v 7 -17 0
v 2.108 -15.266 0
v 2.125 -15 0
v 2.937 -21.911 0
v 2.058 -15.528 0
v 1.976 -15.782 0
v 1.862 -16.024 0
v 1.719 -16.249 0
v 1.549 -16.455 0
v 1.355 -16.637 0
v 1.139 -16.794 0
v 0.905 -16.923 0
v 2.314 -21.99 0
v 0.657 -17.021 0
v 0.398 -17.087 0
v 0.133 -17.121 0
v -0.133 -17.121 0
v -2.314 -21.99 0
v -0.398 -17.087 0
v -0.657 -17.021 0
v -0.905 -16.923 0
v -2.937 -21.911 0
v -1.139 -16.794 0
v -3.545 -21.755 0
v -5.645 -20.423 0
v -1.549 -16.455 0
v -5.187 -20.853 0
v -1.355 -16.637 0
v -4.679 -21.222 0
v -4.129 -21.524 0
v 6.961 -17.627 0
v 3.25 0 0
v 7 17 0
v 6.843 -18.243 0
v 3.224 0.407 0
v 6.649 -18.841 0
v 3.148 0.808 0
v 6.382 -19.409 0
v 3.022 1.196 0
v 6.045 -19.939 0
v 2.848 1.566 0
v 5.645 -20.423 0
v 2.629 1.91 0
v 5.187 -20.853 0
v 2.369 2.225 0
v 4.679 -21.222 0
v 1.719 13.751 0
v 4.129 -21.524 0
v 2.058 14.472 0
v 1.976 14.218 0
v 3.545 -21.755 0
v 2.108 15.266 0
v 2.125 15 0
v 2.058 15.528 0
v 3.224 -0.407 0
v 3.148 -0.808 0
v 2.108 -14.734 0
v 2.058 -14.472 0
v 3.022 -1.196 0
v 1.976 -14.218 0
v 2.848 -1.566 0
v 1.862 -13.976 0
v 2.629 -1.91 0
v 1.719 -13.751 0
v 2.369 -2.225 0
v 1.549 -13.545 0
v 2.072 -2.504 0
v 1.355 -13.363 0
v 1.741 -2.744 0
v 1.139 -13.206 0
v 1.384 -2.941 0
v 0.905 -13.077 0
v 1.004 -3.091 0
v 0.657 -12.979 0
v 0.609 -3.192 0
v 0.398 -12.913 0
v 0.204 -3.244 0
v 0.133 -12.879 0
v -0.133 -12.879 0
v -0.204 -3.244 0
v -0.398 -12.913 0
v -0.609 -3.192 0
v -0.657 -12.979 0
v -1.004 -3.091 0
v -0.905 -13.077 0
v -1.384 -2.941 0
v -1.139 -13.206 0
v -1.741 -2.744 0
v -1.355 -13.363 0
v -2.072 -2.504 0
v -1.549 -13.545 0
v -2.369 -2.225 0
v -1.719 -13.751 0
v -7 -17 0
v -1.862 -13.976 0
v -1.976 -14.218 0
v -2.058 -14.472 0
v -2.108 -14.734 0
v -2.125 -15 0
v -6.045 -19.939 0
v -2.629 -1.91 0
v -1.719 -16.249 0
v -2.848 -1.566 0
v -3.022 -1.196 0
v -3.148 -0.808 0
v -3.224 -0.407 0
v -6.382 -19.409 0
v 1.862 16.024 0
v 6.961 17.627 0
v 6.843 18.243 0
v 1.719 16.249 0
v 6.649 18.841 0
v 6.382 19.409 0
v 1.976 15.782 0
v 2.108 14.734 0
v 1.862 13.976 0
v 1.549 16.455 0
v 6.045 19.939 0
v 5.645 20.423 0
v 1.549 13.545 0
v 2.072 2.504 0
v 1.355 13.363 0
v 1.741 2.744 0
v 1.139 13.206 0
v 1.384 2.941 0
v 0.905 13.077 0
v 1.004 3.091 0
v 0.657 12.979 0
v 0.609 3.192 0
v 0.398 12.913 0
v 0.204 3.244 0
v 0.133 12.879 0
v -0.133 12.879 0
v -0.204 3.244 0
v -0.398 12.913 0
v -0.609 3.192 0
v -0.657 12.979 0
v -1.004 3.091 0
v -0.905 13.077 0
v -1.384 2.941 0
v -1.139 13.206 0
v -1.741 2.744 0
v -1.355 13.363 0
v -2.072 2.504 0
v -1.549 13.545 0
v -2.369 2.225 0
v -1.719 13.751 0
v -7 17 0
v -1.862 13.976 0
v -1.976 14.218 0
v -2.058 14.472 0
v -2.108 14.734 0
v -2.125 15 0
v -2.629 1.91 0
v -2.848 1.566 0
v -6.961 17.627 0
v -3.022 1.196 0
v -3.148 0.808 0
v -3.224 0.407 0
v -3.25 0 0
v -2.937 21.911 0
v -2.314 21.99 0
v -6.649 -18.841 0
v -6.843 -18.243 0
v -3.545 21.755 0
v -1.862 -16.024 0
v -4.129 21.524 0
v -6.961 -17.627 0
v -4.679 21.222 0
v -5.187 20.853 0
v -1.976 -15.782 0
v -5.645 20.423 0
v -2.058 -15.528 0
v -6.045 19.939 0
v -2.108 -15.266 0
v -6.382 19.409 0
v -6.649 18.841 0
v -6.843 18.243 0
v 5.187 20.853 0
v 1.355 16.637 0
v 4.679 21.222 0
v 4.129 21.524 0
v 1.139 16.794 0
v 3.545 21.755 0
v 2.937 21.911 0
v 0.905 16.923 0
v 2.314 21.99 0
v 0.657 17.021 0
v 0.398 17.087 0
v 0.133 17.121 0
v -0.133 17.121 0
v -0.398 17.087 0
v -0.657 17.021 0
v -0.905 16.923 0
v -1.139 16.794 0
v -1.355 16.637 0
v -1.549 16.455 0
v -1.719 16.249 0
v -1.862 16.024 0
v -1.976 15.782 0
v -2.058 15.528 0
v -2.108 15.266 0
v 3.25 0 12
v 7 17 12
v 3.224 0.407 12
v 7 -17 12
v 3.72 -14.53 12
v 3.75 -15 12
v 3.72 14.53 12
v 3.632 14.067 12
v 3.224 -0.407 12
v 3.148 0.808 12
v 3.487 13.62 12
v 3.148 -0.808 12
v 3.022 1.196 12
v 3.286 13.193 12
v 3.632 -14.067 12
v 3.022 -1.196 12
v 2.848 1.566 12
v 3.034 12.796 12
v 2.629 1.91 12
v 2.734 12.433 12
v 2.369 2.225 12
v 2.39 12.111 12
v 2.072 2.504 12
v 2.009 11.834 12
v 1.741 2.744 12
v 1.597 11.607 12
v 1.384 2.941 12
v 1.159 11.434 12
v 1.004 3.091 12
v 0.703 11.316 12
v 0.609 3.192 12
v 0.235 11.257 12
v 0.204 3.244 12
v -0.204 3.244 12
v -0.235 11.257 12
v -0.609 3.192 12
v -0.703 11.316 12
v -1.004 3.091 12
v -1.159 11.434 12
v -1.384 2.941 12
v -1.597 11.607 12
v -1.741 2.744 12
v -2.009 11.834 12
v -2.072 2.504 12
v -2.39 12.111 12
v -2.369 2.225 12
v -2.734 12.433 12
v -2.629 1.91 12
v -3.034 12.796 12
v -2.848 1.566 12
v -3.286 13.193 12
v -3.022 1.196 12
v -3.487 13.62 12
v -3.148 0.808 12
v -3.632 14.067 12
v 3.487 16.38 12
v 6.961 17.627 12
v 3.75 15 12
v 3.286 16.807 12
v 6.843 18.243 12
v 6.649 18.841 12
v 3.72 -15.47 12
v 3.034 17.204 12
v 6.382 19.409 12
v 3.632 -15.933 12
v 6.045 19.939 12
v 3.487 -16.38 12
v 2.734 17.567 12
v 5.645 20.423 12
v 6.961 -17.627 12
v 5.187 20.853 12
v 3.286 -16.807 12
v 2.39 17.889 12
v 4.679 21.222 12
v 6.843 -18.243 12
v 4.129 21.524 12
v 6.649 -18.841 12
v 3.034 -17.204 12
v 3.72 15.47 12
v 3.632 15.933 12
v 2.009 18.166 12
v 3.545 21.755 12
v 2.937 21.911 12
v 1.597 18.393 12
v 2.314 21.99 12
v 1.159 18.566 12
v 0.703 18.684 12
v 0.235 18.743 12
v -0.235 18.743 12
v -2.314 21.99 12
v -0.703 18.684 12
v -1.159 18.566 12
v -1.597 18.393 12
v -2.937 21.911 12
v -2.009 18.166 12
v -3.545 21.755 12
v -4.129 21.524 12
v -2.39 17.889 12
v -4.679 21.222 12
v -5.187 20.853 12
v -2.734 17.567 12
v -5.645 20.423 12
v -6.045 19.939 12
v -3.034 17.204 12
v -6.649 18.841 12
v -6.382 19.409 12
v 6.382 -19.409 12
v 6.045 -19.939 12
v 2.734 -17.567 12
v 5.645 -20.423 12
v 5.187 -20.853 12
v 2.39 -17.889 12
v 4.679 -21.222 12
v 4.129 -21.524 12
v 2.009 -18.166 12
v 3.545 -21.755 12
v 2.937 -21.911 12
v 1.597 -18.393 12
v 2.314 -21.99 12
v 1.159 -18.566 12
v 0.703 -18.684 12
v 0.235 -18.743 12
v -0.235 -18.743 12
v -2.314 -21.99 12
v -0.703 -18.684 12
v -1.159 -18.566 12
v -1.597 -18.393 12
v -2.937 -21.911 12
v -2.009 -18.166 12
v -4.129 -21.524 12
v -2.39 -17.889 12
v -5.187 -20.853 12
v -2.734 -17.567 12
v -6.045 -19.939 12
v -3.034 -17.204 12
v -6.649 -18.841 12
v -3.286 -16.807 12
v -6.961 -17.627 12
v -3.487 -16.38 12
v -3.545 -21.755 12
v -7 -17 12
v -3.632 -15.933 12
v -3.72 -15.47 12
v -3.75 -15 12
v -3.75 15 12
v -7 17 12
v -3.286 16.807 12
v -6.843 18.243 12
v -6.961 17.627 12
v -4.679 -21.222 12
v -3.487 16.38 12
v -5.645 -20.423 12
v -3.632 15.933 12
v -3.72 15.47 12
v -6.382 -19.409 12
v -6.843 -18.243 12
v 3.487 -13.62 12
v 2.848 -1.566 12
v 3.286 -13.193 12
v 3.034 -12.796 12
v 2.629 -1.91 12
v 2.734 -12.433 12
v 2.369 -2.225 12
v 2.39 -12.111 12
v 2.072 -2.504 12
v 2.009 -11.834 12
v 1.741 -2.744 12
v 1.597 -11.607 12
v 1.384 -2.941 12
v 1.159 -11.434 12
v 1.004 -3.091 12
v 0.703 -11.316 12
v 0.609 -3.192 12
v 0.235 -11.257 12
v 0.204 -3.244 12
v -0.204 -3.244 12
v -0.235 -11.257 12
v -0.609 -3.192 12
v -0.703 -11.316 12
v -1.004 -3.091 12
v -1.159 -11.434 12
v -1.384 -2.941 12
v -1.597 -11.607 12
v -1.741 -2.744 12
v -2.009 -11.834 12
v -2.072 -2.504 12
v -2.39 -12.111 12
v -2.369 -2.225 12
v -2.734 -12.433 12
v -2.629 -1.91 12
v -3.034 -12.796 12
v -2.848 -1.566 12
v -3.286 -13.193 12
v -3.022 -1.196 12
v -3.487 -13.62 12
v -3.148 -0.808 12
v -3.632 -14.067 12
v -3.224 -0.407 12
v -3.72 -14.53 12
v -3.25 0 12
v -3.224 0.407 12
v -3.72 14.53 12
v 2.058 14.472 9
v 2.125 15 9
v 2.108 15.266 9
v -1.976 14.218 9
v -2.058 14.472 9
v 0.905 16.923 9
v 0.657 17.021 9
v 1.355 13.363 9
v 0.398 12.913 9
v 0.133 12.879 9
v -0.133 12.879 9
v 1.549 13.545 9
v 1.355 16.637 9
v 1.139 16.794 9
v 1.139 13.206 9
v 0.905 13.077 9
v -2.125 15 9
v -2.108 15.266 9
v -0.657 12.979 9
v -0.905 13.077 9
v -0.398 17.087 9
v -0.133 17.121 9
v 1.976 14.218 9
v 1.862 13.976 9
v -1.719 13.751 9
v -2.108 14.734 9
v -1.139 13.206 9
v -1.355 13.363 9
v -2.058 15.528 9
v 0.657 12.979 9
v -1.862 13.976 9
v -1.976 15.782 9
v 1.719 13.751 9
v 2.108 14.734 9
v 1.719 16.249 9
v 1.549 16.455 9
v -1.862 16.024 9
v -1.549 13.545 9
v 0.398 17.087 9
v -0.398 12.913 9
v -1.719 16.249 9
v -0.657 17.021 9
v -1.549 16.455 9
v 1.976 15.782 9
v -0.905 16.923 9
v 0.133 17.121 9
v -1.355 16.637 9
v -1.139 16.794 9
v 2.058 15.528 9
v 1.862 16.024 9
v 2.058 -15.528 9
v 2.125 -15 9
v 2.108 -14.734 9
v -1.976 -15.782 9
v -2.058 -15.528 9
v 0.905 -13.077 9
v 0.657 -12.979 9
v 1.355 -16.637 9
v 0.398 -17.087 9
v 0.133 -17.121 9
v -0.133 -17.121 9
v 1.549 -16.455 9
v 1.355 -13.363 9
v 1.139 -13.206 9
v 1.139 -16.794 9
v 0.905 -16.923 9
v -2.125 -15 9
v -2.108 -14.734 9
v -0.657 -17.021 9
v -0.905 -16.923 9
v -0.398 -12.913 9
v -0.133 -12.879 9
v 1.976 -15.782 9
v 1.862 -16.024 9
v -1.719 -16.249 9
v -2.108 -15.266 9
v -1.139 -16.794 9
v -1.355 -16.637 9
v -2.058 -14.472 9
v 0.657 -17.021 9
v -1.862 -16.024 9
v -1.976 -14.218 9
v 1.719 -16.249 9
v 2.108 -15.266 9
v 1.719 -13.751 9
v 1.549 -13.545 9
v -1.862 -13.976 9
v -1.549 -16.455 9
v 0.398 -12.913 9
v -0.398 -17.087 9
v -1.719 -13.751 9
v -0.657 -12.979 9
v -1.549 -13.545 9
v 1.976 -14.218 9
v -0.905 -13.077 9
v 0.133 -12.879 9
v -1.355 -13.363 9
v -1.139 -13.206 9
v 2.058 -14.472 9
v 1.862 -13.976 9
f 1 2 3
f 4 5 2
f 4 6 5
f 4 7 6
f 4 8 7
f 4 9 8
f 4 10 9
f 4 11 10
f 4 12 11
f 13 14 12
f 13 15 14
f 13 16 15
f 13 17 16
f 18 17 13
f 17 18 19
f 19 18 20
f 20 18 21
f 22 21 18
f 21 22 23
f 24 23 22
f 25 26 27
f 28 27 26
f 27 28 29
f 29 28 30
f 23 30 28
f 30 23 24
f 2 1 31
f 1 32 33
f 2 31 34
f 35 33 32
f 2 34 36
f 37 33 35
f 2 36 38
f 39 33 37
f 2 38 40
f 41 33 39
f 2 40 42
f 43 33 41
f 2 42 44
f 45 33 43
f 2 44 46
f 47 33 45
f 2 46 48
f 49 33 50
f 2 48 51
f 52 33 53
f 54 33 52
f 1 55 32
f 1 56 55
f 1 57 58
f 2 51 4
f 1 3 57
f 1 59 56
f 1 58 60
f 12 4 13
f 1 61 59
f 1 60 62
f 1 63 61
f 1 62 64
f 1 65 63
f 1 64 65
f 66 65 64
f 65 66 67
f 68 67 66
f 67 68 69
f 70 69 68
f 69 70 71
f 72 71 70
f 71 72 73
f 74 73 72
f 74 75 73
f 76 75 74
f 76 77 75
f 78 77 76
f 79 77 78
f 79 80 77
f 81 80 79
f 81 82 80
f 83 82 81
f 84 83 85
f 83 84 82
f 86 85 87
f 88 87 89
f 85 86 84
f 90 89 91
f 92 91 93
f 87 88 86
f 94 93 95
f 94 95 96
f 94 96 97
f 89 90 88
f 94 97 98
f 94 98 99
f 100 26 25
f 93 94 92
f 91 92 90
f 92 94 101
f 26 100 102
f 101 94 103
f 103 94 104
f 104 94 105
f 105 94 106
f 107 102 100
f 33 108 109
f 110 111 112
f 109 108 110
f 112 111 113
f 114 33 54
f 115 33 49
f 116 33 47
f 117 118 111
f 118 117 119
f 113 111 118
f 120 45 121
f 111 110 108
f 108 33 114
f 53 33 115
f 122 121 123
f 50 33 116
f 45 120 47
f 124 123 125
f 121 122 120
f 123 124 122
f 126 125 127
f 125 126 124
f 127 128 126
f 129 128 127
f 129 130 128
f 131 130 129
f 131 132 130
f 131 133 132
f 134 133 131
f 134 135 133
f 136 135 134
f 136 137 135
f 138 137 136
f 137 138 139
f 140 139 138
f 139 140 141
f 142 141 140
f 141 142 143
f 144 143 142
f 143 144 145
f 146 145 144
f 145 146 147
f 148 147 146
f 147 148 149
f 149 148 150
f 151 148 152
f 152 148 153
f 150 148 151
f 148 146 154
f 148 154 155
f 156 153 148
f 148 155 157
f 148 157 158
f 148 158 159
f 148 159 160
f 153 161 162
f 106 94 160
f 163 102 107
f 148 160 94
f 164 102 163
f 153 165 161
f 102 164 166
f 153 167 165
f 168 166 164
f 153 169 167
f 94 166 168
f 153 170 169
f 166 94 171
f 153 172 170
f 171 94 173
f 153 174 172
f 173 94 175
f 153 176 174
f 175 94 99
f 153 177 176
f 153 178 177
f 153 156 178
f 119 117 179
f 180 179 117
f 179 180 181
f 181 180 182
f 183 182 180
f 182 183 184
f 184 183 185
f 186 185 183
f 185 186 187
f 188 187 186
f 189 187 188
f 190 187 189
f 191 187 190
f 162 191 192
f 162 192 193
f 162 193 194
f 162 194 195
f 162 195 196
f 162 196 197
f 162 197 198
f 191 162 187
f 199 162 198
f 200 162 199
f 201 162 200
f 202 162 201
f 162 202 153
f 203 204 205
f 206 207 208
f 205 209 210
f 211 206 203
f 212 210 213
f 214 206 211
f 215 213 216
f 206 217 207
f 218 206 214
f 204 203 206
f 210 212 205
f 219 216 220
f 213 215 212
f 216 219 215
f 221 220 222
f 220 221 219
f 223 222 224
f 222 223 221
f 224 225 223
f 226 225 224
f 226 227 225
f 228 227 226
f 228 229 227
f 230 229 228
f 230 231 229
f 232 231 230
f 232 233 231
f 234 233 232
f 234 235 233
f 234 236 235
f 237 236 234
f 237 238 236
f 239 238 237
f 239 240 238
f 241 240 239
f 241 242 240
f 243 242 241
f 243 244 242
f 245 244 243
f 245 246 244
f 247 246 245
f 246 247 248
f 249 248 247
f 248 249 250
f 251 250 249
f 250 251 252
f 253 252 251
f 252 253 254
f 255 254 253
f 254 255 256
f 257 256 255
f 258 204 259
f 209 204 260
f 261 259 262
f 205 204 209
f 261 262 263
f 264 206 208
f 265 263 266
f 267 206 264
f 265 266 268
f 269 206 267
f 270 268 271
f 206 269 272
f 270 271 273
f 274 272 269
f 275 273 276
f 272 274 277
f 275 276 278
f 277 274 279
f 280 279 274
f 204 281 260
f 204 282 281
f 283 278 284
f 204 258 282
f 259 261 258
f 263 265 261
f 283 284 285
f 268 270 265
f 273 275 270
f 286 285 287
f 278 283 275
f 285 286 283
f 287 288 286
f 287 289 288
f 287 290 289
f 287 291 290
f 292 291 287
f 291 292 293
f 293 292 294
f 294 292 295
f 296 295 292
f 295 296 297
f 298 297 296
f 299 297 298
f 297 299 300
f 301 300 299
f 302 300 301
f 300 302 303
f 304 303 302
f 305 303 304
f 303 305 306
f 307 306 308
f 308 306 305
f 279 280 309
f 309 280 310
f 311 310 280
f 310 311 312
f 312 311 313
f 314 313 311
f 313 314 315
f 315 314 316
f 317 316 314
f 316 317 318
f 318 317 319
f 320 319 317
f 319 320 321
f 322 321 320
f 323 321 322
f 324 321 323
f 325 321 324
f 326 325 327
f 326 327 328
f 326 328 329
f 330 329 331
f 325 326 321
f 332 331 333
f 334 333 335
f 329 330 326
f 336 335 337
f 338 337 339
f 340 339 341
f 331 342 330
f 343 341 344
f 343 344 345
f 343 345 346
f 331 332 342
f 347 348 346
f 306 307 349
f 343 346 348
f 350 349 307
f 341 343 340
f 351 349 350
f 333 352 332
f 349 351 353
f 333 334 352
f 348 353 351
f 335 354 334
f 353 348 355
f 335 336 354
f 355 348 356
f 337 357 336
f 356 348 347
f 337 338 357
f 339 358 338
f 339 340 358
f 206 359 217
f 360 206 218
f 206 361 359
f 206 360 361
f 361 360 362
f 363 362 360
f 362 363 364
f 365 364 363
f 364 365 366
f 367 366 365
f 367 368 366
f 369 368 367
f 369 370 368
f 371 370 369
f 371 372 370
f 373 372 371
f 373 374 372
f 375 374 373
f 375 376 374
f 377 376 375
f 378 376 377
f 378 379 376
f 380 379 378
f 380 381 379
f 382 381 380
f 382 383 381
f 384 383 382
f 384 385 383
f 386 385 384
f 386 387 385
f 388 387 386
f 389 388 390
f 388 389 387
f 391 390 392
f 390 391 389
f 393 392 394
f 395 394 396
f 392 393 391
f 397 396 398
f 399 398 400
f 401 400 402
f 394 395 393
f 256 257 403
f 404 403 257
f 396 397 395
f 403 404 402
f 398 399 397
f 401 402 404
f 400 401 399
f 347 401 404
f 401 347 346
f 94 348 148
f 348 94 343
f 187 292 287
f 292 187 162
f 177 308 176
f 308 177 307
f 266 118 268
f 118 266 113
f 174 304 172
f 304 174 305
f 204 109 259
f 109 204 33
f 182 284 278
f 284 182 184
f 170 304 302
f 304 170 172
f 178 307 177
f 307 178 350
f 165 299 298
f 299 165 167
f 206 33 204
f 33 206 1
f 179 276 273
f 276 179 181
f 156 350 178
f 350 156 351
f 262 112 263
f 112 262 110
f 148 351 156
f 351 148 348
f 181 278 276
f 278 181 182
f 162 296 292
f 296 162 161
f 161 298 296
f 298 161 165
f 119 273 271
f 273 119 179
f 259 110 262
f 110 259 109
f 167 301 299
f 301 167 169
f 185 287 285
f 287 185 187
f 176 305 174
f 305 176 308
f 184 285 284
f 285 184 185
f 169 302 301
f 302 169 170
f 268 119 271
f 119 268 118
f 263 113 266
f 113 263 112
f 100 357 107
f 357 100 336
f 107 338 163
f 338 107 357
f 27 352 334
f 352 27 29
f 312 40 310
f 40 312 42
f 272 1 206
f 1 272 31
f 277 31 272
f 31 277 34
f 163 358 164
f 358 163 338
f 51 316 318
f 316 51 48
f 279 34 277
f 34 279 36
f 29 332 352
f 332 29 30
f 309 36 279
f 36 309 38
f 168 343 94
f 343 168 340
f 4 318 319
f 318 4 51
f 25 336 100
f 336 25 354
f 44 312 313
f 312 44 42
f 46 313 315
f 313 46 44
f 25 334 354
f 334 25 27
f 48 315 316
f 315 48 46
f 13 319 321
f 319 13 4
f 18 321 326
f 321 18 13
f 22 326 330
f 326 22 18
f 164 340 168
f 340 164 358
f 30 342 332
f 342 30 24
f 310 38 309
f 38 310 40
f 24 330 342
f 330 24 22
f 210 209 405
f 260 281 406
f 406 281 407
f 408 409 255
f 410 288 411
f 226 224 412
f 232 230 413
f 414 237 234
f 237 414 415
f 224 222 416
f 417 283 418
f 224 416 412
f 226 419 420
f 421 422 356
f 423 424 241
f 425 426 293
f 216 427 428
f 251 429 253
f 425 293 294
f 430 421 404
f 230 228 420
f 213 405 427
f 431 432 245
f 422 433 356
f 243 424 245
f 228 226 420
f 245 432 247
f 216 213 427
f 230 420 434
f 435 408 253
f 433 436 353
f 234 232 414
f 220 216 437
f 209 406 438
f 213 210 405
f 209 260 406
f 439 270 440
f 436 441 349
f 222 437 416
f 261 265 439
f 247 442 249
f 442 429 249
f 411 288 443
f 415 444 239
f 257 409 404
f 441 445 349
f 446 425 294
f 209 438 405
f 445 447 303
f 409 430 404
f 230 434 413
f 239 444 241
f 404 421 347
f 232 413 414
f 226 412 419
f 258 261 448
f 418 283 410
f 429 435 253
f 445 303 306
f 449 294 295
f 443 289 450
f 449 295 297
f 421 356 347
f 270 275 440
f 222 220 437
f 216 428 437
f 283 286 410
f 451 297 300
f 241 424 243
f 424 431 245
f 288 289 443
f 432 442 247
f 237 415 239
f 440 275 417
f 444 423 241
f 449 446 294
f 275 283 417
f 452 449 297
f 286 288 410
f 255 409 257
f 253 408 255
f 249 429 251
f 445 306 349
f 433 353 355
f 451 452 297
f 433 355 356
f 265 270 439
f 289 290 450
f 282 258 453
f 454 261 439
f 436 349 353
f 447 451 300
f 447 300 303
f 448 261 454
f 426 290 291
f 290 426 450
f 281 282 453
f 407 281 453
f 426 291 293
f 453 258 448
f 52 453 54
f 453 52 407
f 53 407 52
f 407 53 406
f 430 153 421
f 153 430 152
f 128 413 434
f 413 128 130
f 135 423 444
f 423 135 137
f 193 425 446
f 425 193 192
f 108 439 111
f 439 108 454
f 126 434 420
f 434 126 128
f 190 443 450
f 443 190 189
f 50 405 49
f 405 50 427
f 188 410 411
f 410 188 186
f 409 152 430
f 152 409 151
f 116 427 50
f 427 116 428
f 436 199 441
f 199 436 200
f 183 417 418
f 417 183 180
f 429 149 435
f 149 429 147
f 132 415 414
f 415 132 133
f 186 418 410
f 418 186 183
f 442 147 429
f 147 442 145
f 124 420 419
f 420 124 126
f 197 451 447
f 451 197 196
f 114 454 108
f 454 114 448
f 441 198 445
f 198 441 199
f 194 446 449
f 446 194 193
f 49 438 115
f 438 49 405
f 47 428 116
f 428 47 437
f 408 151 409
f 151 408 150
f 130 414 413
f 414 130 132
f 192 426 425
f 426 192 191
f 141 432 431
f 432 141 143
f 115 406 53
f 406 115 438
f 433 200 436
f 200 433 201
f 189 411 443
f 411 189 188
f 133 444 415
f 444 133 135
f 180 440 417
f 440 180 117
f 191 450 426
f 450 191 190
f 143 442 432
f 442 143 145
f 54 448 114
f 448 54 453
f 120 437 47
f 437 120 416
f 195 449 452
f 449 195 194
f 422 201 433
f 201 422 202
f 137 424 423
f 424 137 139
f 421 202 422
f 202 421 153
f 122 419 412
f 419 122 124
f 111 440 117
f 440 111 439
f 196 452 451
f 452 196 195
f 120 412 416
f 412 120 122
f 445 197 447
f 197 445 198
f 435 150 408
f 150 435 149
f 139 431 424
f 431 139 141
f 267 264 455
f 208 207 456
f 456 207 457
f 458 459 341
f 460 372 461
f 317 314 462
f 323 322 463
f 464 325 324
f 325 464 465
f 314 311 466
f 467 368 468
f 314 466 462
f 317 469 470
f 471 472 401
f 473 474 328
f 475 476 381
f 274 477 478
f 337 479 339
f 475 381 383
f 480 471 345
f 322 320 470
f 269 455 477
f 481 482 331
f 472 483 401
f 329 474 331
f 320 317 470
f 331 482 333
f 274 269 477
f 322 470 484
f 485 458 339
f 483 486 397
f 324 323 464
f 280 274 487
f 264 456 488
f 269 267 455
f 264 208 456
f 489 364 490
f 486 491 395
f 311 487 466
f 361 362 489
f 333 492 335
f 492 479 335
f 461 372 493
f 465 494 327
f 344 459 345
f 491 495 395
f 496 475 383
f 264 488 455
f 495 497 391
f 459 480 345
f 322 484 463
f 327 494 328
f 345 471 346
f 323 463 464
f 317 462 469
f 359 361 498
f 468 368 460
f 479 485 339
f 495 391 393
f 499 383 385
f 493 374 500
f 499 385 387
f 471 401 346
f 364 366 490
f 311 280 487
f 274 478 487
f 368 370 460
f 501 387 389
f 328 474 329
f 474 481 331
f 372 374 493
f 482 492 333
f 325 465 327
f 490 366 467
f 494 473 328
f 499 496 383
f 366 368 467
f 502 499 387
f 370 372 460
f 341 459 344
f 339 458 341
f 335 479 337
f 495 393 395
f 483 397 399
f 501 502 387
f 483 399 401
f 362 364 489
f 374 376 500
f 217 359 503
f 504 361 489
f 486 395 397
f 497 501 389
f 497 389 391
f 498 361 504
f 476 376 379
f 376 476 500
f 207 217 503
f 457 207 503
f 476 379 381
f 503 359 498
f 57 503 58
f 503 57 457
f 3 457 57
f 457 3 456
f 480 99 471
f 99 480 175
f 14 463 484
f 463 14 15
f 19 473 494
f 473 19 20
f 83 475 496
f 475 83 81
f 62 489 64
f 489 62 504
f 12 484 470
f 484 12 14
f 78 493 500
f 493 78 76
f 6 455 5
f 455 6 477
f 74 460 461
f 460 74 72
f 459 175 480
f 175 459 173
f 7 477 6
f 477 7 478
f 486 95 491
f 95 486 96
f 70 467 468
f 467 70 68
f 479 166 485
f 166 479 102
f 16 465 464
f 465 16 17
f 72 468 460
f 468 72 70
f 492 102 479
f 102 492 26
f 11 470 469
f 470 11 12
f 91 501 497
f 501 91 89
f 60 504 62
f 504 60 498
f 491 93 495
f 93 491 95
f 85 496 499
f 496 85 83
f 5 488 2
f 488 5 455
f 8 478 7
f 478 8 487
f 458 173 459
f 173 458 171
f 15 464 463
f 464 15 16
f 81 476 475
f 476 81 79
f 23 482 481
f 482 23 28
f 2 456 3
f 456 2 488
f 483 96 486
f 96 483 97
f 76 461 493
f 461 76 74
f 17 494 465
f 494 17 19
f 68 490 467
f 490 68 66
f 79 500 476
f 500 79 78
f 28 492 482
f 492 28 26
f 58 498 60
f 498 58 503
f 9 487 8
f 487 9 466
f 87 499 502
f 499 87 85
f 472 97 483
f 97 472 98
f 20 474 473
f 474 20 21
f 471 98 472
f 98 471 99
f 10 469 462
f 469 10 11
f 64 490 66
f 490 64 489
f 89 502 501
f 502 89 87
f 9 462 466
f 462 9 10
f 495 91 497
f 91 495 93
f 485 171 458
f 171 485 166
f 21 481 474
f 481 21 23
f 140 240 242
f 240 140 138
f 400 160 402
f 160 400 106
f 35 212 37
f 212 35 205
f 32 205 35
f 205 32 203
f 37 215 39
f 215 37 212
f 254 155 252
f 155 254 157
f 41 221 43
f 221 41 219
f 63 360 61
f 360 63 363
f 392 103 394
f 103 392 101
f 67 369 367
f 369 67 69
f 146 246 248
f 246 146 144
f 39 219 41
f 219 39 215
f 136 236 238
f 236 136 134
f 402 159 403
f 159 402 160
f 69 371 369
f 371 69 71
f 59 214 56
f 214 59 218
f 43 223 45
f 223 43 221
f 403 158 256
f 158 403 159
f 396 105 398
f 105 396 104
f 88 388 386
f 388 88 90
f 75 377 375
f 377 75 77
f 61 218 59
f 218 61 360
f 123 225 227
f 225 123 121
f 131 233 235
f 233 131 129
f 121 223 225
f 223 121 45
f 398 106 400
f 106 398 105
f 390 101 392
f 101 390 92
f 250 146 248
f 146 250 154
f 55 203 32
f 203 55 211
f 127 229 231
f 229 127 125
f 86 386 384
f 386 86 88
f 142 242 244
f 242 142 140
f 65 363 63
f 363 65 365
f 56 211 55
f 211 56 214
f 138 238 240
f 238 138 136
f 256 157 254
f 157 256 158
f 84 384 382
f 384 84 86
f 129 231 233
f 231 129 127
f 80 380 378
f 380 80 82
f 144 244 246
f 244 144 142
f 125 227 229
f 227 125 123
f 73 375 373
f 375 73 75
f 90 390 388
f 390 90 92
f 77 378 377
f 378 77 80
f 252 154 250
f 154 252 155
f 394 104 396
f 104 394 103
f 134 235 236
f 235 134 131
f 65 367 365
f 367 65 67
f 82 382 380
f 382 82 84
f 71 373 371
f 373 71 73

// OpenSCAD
$fn = 50;


difference() {
	union() {
		cylinder(h = 12, r = 7.0000000000);
		translate(v = [0.0000000000, 7.5000000000, 0]) {
			hull() {
				translate(v = [-2.0000000000, 9.5000000000, 0]) {
					cylinder(h = 12, r = 5);
				}
				translate(v = [2.0000000000, 9.5000000000, 0]) {
					cylinder(h = 12, r = 5);
				}
				translate(v = [-2.0000000000, -9.5000000000, 0]) {
					cylinder(h = 12, r = 5);
				}
				translate(v = [2.0000000000, -9.5000000000, 0]) {
					cylinder(h = 12, r = 5);
				}
			}
		}
		translate(v = [0.0000000000, 7.5000000000, 0]) {
			hull() {
				translate(v = [-2.0000000000, 9.5000000000, 0]) {
					cylinder(h = 12, r = 5);
				}
				translate(v = [2.0000000000, 9.5000000000, 0]) {
					cylinder(h = 12, r = 5);
				}
				translate(v = [-2.0000000000, -9.5000000000, 0]) {
					cylinder(h = 12, r = 5);
				}
				translate(v = [2.0000000000, -9.5000000000, 0]) {
					cylinder(h = 12, r = 5);
				}
			}
		}
		translate(v = [0.0000000000, -7.5000000000, 0]) {
			hull() {
				translate(v = [-2.0000000000, 9.5000000000, 0]) {
					cylinder(h = 12, r = 5);
				}
				translate(v = [2.0000000000, 9.5000000000, 0]) {
					cylinder(h = 12, r = 5);
				}
				translate(v = [-2.0000000000, -9.5000000000, 0]) {
					cylinder(h = 12, r = 5);
				}
				translate(v = [2.0000000000, -9.5000000000, 0]) {
					cylinder(h = 12, r = 5);
				}
			}
		}
		translate(v = [0.0000000000, -7.5000000000, 0]) {
			hull() {
				translate(v = [-2.0000000000, 9.5000000000, 0]) {
					cylinder(h = 12, r = 5);
				}
				translate(v = [2.0000000000, 9.5000000000, 0]) {
					cylinder(h = 12, r = 5);
				}
				translate(v = [-2.0000000000, -9.5000000000, 0]) {
					cylinder(h = 12, r = 5);
				}
				translate(v = [2.0000000000, -9.5000000000, 0]) {
					cylinder(h = 12, r = 5);
				}
			}
		}
	}
	union() {
		translate(v = [0.0000000000, 15.0000000000, 12]) {
			rotate(a = [0, 0, 0]) {
				difference() {
					union() {
						#translate(v = [0, 0, -12.0000000000]) {
							cylinder(h = 12, r = 2.0000000000);
						}
						#translate(v = [0, 0, -3]) {
							cylinder(h = 3, r1 = 2.1250000000, r2 = 3.7500000000);
						}
						#translate(v = [0, 0, -12.0000000000]) {
							cylinder(h = 12, r = 2.1250000000);
						}
						#translate(v = [0, 0, -12.0000000000]) {
							cylinder(h = 12, r = 2.0000000000);
						}
					}
					union();
				}
			}
		}
		translate(v = [0.0000000000, 15.0000000000, 12]) {
			rotate(a = [0, 0, 0]) {
				difference() {
					union() {
						#translate(v = [0, 0, -12.0000000000]) {
							cylinder(h = 12, r = 2.0000000000);
						}
						#translate(v = [0, 0, -3]) {
							cylinder(h = 3, r1 = 2.1250000000, r2 = 3.7500000000);
						}
						#translate(v = [0, 0, -12.0000000000]) {
							cylinder(h = 12, r = 2.1250000000);
						}
						#translate(v = [0, 0, -12.0000000000]) {
							cylinder(h = 12, r = 2.0000000000);
						}
					}
					union();
				}
			}
		}
		translate(v = [0.0000000000, -15.0000000000, 12]) {
			rotate(a = [0, 0, 0]) {
				difference() {
					union() {
						#translate(v = [0, 0, -12.0000000000]) {
							cylinder(h = 12, r = 2.0000000000);
						}
						#translate(v = [0, 0, -3]) {
							cylinder(h = 3, r1 = 2.1250000000, r2 = 3.7500000000);
						}
						#translate(v = [0, 0, -12.0000000000]) {
							cylinder(h = 12, r = 2.1250000000);
						}
						#translate(v = [0, 0, -12.0000000000]) {
							cylinder(h = 12, r = 2.0000000000);
						}
					}
					union();
				}
			}
		}
		translate(v = [0.0000000000, -15.0000000000, 12]) {
			rotate(a = [0, 0, 0]) {
				difference() {
					union() {
						#translate(v = [0, 0, -12.0000000000]) {
							cylinder(h = 12, r = 2.0000000000);
						}
						#translate(v = [0, 0, -3]) {
							cylinder(h = 3, r1 = 2.1250000000, r2 = 3.7500000000);
						}
						#translate(v = [0, 0, -12.0000000000]) {
							cylinder(h = 12, r = 2.1250000000);
						}
						#translate(v = [0, 0, -12.0000000000]) {
							cylinder(h = 12, r = 2.0000000000);
						}
					}
					union();
				}
			}
		}
		translate(v = [0, 0, -100]) {
			cylinder(h = 200, r = 3.2500000000);
		}
		translate(v = [0, 0, -100]) {
			cylinder(h = 200, r = 1.8000000000);
		}
	}
}
